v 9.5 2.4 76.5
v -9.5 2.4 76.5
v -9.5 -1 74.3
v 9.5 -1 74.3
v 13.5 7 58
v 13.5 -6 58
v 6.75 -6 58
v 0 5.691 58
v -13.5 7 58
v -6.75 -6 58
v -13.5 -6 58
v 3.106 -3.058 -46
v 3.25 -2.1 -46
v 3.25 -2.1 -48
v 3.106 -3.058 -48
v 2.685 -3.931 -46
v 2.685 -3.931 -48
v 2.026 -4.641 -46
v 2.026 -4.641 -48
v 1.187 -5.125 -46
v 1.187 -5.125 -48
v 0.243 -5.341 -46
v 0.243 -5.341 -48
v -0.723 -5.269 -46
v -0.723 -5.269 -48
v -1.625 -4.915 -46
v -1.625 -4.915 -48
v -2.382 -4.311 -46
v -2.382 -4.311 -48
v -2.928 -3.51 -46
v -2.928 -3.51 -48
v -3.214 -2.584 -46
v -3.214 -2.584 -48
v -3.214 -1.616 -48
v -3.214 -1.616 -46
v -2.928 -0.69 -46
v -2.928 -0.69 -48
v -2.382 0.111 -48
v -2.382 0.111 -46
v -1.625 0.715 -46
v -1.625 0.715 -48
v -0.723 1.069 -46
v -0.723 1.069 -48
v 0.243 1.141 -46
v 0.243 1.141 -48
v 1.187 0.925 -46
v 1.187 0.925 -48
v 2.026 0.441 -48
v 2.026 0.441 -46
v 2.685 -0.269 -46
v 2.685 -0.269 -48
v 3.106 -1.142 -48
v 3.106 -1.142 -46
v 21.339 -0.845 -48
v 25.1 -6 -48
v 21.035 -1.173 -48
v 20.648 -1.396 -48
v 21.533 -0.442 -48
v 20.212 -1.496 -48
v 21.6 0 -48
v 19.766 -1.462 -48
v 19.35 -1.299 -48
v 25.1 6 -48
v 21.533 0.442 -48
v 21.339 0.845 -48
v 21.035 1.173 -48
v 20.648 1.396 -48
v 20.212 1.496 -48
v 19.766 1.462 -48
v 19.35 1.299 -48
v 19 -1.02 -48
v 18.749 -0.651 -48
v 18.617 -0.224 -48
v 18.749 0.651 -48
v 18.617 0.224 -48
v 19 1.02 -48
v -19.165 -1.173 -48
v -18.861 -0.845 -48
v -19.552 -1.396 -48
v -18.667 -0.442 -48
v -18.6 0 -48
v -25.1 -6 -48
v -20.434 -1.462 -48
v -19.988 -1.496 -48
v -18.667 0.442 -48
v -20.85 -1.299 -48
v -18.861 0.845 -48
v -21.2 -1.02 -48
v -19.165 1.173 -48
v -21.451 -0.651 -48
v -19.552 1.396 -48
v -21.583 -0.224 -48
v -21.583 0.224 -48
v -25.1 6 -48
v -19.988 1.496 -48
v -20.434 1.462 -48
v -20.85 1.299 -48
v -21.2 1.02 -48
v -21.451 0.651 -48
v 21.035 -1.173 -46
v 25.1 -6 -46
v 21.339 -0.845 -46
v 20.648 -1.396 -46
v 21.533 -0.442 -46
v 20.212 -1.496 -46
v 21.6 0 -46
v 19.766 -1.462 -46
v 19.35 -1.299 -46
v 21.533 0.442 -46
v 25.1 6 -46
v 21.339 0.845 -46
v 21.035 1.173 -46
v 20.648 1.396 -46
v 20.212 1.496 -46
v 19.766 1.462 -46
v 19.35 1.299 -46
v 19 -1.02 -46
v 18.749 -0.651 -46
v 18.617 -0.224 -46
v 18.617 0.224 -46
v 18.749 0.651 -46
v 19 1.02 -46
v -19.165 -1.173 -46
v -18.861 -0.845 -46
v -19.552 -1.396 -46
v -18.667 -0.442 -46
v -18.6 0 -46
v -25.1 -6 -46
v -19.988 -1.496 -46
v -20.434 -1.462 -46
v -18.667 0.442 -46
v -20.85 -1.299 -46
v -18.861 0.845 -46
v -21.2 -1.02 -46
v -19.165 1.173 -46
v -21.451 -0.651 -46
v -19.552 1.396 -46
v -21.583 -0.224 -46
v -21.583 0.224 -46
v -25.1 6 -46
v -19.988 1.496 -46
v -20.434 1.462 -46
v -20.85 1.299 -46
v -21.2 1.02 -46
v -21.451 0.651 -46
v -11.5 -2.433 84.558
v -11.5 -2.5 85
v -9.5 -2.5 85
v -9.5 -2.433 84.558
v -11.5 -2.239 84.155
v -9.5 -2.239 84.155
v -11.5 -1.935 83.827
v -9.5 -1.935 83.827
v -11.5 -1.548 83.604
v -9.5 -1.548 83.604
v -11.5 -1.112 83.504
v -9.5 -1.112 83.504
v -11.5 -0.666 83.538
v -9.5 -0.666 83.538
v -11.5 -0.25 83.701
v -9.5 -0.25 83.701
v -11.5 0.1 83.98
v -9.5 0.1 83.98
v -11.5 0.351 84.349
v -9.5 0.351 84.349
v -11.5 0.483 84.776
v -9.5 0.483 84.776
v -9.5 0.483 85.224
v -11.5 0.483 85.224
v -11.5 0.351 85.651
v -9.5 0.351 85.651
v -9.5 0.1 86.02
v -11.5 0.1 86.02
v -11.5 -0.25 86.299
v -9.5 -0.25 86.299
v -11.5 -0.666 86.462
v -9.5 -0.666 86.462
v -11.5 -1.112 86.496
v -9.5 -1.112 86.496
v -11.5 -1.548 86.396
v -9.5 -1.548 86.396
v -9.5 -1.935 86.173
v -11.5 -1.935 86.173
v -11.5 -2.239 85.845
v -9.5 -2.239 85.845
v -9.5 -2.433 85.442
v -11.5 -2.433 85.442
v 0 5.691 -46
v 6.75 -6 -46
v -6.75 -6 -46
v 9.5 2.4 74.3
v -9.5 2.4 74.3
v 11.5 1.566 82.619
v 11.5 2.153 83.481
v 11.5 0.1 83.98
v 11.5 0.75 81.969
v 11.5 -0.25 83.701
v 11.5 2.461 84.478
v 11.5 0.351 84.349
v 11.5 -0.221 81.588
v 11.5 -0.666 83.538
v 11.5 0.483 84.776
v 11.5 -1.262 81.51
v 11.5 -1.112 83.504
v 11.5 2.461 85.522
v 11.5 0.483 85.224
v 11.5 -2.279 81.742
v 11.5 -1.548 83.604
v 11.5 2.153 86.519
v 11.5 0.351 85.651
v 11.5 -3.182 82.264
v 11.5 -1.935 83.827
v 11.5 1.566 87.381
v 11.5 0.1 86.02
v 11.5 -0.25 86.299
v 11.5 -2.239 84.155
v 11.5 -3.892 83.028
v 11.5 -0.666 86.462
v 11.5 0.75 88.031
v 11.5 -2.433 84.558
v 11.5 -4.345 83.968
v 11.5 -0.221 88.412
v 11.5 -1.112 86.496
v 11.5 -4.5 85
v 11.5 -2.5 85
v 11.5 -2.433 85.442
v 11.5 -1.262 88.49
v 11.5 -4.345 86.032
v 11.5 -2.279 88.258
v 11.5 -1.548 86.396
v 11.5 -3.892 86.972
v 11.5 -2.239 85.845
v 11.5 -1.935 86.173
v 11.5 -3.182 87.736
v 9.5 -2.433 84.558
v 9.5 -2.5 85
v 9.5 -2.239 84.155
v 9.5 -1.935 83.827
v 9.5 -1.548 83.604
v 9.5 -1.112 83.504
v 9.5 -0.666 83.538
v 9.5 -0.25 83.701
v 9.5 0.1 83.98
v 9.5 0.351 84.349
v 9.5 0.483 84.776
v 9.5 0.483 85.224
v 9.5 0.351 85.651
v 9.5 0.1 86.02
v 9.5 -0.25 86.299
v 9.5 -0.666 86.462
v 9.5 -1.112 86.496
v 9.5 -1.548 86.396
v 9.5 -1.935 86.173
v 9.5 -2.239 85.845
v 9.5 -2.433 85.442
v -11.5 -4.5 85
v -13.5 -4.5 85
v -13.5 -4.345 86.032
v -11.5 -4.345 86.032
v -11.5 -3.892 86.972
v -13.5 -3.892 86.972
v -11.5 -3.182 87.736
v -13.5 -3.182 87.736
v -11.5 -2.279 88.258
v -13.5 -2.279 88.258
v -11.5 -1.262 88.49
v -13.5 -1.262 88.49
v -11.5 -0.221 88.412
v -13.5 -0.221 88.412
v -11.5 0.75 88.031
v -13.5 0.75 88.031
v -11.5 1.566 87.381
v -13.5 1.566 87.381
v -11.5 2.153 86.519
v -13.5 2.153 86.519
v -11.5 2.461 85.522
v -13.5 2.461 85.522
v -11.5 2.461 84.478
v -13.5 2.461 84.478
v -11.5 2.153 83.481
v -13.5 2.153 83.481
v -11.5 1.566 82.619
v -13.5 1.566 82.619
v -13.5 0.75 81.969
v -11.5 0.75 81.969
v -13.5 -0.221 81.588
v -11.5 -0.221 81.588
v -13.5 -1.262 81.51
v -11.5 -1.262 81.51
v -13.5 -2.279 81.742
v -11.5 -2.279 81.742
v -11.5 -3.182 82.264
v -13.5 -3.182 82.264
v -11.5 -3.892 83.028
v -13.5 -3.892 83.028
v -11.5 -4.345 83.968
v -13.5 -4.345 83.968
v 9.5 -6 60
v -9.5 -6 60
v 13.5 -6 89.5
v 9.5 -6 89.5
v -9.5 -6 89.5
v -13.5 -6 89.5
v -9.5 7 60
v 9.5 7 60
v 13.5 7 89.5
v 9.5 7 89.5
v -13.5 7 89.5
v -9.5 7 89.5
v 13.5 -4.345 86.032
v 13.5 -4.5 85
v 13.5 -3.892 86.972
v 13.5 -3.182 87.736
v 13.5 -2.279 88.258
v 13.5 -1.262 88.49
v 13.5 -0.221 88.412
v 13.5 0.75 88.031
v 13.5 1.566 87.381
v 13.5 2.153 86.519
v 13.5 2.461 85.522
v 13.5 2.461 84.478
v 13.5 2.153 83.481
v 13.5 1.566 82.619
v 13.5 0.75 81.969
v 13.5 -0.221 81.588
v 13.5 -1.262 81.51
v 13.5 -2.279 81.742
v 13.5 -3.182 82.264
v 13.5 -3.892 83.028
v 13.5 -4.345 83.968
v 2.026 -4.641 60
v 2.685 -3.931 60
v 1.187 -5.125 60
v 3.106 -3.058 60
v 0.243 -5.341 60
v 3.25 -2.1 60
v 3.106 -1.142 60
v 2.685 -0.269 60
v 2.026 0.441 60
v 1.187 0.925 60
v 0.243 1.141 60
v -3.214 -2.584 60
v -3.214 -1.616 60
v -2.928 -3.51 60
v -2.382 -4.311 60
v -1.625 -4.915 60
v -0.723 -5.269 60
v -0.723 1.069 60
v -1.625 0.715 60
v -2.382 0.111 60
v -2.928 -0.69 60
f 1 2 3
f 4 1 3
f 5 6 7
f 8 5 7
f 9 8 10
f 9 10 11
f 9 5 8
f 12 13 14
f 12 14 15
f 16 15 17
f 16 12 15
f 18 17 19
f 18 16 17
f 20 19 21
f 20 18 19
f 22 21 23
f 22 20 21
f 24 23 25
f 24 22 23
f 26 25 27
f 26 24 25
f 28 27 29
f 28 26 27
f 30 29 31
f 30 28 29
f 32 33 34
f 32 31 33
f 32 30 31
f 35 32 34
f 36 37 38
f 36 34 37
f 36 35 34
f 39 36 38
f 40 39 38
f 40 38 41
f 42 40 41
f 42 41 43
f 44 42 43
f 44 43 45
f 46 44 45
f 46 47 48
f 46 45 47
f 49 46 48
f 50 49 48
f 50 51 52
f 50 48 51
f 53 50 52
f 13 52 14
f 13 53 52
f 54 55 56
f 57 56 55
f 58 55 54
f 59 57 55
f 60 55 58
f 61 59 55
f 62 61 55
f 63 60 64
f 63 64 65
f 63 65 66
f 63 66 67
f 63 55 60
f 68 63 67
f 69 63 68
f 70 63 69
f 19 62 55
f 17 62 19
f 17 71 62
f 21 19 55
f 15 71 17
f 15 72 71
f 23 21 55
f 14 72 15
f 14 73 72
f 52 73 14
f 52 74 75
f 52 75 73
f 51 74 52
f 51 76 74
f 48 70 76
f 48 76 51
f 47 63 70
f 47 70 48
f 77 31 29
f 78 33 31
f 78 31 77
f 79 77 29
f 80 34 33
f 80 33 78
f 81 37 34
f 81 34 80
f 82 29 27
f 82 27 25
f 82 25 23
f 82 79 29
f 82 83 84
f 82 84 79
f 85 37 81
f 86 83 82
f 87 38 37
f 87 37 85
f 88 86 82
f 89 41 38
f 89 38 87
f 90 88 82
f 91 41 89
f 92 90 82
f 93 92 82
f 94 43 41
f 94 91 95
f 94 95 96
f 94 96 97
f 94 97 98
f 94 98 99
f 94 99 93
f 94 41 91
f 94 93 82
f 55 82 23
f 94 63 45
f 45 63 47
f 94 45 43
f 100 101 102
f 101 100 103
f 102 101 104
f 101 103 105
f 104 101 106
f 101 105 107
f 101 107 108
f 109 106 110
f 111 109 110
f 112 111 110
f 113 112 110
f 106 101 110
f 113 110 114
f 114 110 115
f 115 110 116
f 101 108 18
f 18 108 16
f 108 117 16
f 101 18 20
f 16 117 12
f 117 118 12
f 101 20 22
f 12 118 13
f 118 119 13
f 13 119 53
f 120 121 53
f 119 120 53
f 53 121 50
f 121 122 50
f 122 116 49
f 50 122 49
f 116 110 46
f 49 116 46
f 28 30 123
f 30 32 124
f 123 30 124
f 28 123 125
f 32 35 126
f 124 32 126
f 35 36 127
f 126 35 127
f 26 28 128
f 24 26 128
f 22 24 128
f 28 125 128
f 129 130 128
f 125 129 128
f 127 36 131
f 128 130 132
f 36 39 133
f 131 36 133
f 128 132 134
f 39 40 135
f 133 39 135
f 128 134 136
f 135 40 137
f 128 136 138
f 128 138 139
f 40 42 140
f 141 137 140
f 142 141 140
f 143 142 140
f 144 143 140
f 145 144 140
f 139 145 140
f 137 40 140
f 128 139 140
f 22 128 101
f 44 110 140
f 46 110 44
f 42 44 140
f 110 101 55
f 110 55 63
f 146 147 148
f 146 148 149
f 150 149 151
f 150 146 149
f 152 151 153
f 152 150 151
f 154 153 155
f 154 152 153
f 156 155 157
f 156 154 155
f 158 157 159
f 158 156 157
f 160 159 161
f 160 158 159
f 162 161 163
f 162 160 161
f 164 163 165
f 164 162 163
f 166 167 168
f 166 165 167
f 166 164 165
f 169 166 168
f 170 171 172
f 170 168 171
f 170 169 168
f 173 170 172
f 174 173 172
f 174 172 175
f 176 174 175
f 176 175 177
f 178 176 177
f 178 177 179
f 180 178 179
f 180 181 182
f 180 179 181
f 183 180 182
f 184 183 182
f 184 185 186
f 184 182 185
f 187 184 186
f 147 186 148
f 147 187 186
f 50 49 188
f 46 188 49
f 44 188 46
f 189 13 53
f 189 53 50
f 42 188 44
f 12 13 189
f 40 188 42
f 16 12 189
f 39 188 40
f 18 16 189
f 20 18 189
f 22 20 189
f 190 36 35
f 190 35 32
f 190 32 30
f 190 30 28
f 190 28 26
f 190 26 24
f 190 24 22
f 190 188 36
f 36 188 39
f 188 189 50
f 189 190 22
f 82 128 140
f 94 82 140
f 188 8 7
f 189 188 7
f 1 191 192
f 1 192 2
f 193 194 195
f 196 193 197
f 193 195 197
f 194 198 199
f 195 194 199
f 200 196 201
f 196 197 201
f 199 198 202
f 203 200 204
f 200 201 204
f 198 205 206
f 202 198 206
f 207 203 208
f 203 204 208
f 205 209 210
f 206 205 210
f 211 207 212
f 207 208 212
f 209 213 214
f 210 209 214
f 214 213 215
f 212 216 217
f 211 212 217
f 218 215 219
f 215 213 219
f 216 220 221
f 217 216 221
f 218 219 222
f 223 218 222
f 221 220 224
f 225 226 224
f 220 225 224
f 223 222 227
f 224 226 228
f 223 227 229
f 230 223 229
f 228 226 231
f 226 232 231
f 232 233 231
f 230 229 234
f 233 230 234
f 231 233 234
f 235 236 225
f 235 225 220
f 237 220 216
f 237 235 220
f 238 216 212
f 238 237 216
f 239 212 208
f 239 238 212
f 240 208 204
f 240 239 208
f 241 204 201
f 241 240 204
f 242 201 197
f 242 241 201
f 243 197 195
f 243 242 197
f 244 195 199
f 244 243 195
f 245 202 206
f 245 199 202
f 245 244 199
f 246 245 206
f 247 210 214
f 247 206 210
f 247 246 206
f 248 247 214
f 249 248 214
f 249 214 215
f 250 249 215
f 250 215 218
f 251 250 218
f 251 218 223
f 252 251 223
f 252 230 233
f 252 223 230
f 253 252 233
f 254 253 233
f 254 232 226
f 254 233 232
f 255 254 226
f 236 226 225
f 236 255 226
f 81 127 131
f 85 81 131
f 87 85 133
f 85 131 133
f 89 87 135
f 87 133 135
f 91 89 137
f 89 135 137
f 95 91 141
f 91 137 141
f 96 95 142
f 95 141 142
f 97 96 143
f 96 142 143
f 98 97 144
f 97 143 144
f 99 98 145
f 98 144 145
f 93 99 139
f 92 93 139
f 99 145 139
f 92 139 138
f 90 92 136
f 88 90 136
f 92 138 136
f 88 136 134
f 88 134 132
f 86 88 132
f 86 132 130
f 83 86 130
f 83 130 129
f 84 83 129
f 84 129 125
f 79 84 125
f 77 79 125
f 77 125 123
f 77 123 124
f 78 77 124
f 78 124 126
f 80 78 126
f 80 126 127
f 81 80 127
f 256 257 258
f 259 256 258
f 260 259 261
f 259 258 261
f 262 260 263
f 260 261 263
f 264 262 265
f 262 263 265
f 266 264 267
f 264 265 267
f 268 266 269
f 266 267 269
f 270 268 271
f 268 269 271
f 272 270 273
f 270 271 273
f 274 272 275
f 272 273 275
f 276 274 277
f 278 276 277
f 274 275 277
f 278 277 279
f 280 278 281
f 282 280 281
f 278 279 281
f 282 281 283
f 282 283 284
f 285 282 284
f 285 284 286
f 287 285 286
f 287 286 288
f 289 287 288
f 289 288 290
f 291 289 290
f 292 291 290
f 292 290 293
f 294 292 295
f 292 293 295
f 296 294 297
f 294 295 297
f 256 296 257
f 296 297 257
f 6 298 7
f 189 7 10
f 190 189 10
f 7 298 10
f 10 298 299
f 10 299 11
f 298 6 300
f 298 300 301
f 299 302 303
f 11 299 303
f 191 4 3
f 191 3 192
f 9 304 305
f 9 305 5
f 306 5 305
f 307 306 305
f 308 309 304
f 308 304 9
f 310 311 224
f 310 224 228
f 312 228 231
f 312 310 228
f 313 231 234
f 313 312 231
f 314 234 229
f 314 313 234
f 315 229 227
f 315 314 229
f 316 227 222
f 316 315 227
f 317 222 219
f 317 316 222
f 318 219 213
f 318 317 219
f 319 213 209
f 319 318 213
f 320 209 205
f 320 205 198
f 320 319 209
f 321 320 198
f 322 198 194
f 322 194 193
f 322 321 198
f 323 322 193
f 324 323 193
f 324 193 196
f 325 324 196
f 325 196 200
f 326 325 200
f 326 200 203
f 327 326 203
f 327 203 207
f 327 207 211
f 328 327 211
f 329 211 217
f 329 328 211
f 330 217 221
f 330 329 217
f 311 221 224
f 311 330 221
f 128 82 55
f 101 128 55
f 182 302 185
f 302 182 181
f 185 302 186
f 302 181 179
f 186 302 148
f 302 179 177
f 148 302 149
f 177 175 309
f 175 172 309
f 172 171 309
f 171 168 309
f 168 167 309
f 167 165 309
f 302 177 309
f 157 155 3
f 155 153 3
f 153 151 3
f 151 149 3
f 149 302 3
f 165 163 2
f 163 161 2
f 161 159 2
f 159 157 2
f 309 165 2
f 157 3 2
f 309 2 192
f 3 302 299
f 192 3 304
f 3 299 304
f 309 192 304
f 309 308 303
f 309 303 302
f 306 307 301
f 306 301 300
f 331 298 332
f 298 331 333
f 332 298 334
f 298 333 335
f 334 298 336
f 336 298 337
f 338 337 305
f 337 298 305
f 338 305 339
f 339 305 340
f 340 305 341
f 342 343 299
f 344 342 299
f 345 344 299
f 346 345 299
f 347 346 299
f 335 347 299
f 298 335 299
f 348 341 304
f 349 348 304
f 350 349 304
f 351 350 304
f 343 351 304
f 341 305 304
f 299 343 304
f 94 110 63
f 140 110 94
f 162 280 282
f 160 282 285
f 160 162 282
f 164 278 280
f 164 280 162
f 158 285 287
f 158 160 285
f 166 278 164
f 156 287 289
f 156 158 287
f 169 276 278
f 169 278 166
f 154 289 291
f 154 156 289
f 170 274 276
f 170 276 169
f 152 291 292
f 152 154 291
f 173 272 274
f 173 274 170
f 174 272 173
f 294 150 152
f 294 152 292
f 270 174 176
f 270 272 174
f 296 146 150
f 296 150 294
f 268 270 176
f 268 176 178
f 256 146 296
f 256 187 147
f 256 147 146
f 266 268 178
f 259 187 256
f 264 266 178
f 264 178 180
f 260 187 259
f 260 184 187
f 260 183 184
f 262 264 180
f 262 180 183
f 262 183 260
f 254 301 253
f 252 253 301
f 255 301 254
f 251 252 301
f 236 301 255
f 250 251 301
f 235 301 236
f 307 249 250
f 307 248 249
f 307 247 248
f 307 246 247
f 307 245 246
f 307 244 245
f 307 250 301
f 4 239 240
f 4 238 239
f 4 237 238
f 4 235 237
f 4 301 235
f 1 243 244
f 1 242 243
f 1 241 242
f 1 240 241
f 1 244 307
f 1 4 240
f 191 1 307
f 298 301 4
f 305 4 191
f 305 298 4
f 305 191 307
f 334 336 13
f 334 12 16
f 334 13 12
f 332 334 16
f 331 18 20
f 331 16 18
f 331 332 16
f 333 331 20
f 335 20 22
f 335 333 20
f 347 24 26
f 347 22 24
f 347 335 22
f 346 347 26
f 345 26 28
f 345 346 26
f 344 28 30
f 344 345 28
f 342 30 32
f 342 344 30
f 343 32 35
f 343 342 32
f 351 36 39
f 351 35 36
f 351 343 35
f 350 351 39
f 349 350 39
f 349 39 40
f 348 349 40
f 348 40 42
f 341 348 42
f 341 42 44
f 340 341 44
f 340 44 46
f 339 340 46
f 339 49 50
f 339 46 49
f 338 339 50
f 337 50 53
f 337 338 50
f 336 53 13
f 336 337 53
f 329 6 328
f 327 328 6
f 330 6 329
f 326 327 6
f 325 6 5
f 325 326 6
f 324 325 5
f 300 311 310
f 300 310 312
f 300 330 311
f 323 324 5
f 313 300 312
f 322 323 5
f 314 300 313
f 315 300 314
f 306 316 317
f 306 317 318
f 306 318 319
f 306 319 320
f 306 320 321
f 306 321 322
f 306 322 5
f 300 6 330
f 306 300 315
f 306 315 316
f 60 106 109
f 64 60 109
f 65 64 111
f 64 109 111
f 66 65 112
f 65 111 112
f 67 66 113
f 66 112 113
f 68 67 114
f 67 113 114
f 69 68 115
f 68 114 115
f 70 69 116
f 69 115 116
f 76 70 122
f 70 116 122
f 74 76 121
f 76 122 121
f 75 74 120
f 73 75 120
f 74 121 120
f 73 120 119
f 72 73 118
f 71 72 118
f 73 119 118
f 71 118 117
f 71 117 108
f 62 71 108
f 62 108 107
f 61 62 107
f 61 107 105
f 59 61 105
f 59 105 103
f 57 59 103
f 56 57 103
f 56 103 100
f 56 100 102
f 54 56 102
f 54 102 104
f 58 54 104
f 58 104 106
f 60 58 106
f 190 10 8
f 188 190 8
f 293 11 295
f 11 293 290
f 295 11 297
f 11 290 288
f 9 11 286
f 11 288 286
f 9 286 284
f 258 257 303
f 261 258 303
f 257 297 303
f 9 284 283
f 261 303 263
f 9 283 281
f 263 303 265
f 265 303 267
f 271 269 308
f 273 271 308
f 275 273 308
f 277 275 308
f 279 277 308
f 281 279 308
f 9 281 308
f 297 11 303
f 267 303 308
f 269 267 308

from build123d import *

# Parameters (mm, degrees)
SKETCH_1_W                     = 50.2
SKETCH_1_H                     = 22
EXTRUDE_1_DEPTH                = 2.5
SKETCH_2_R                     = 1.5
CUT_EXTRUDE_1_DEPTH            = 2.5
SKETCH_4_W                     = 4
SKETCH_4_H                     = 16
EXTRUDE_2_DEPTH                = 87
EXTRUDE_3_REACH                = 100.673
SKETCH_5_R                     = 2
CUT_EXTRUDE_2_DEPTH            = 99.673248654
CUT_EXTRUDE_2_DEPTH_BACK       = 99.673248654
SKETCH_6_R                     = 1.5
SKETCH_7_R                     = 3.5
CUT_EXTRUDE_3_DEPTH            = 2
FILLET_1_R                     = 2
SKETCH_8_W                     = 50.2
SKETCH_8_H                     = 2.5
EXTRUDE_4_DEPTH                = 3
EXTRUDE_8_DEPTH                = 22
SKETCH_16_W                    = 51.125372974
SKETCH_16_H                    = 33.398780813
CUT_EXTRUDE_4_DEPTH            = 60
SKETCH_17_W                    = 27
SKETCH_17_H                    = 16
EXTRUDE_9_DEPTH                = 2
EXTRUDE_11_DEPTH               = 104
SKETCH_19_W                    = 50.2
SKETCH_19_H                    = 29
EXTRUDE_12_DEPTH               = 2
SKETCH_20_R                    = 1.5
CUT_EXTRUDE_5_DEPTH            = 8
SPLIT_BODIES_1_SURFACE_1_BACK  = 150.222
SPLIT_BODIES_1_SURFACE_1_DEPTH = 300.444
SPLIT_BODIES_1_SURFACE_2_BACK  = 150.222
SPLIT_BODIES_1_SURFACE_2_DEPTH = 300.444
CUT_EXTRUDE_7_DEPTH            = 164
CUT_EXTRUDE_7_DEPTH_BACK       = 164
SKETCH_21_W                    = 50.2
SKETCH_21_H                    = 17
CUT_EXTRUDE_9_DEPTH            = 10
CUT_EXTRUDE_9_DEPTH_BACK       = 110
SKETCH_26_R                    = 3.25


with BuildPart() as part:
    # 草图1 → 凸台-拉伸1 (new body)
    with BuildSketch(Plane.XY):
        with Locations((0, -5)):
            Rectangle(SKETCH_1_W, SKETCH_1_H)
    extrude(amount=EXTRUDE_1_DEPTH)

    # 草图2 → 切除-拉伸1 (cut)
    with BuildSketch(Plane.XY.offset(2.5)):
        with Locations((-20.1, 0)):
            Circle(SKETCH_2_R)
        with Locations(Location((20.1, 0, 0), (0, 0, 180))):
            Circle(SKETCH_2_R)
    extrude(amount=-CUT_EXTRUDE_1_DEPTH, mode=Mode.SUBTRACT)

    # 草图4 → 凸台-拉伸2 (add)
    with BuildSketch(Plane.XY.offset(2.5)):
        with Locations((-11.5, -15)):
            Rectangle(SKETCH_4_W, SKETCH_4_H)
        with Locations((11.5, -15)):
            Rectangle(SKETCH_4_W, SKETCH_4_H)
    extrude(amount=EXTRUDE_2_DEPTH)

    # 草图5 → 凸台-拉伸3 (add, up to next)
    with BuildSketch(Plane.ZY.offset(-9.5), mode=Mode.PRIVATE) as extrude_3_sk1:
        with Locations((46, -15)):
            Circle(SKETCH_5_R)
    extrude_3_tool1 = extrude(extrude_3_sk1.sketch, amount=EXTRUDE_3_REACH, mode=Mode.PRIVATE) - part.part
    add(extrude_3_tool1.solids().sort_by_distance((9.5, -15, 46))[0])

    # 草图6 → 切除-拉伸2 (cut, two sides: drawn at the far end of the back side and taken through both)
    with BuildSketch(Plane(origin=(-9.5, 0, 0), x_dir=(0, 0, -1), z_dir=(1, 0, 0)).offset(-CUT_EXTRUDE_2_DEPTH_BACK)):
        with Locations(Location((-85, -15, 0), (0, 0, 270))):
            Circle(SKETCH_6_R)
    extrude(amount=CUT_EXTRUDE_2_DEPTH + CUT_EXTRUDE_2_DEPTH_BACK, mode=Mode.SUBTRACT)

    # 草图7 → 切除-拉伸3 (cut)
    with BuildSketch(Plane.ZY.offset(13.5)):
        with Locations(Location((85, -15, 0), (0, 0, 270))):
            Circle(SKETCH_7_R)
    cut_extrude_3 = extrude(amount=-CUT_EXTRUDE_3_DEPTH, mode=Mode.SUBTRACT)

    # 镜向1: 切除-拉伸3 across plane
    add(cut_extrude_3.mirror(Plane(origin=(0, 0, 0), x_dir=(0, 0, 1), z_dir=(1, 0, 0))), mode=Mode.SUBTRACT)

    # 圆角1
    fillet_1_edges = [part.edges().sort_by_distance(p)[0] for p in [
        (-11.5, -16, 2.5),
        (11.5, -16, 2.5),
    ]]
    fillet(fillet_1_edges, radius=FILLET_1_R)

    # 草图8 → 凸台-拉伸4 (add)
    with BuildSketch(Plane(origin=(0, 6, 0), x_dir=(1, 0, 0), z_dir=(0, 1, 0))):
        with Locations((0, -1.25)):
            Rectangle(SKETCH_8_W, SKETCH_8_H)
    extrude(amount=EXTRUDE_4_DEPTH)

    # 草图15 → 凸台-拉伸8 (add)
    with BuildSketch(Plane.ZY.offset(-9.5)):
        Polygon((74.3, -11.6), (76.5, -11.6), (74.3, -15), align=None)
    extrude(amount=EXTRUDE_8_DEPTH)

    # 草图16 → 切除-拉伸4 (cut)
    with BuildSketch(Plane(origin=(0, 0, 0), x_dir=(-1, 0, 0), z_dir=(0, 0, -1))):
        with Locations((0.462686487, -7.699390407)):
            Rectangle(SKETCH_16_W, SKETCH_16_H)
    extrude(amount=-CUT_EXTRUDE_4_DEPTH, mode=Mode.SUBTRACT)

    # 草图17 → 凸台-拉伸9 (add)
    with BuildSketch(Plane(origin=(0, 0, 60), x_dir=(-1, 0, 0), z_dir=(0, 0, -1))):
        with Locations((0, -15)):
            Rectangle(SKETCH_17_W, SKETCH_17_H)
    extrude(amount=EXTRUDE_9_DEPTH)

    # 草图18 → 凸台-拉伸11 (add)
    with BuildSketch(Plane(origin=(0, 0, 58), x_dir=(-1, 0, 0), z_dir=(0, 0, -1))):
        Polygon((0, -8.308657049), (-6.75, -20), (6.75, -20), align=None)
    extrude(amount=EXTRUDE_11_DEPTH)

    # 草图19 → 凸台-拉伸12 (add)
    with BuildSketch(Plane(origin=(0, 0, -46), x_dir=(-1, 0, 0), z_dir=(0, 0, -1))):
        with Locations((0, -8.5)):
            Rectangle(SKETCH_19_W, SKETCH_19_H)
    extrude(amount=EXTRUDE_12_DEPTH)

    # 草图20 → 切除-拉伸5 (cut)
    with BuildSketch(Plane.XY.offset(-46)):
        with Locations((-20.1, 0)):
            Circle(SKETCH_20_R)
        with Locations((20.1, 0)):
            Circle(SKETCH_20_R)
    extrude(amount=-CUT_EXTRUDE_5_DEPTH, mode=Mode.SUBTRACT)


with BuildPart() as body_2:
    # Split Bodies 1: the piece behind the surface
    add(part.part)
    # Split Bodies 1 surface: a surface, the sketch's curves swept straight by 300.444 mm
    with BuildLine(Plane(origin=(25.1, 0, 0), x_dir=(0, 0, -1), z_dir=(1, 0, 0)).offset(-SPLIT_BODIES_1_SURFACE_1_BACK), mode=Mode.PRIVATE) as split_bodies_1_surface_1_path:
        Line((46, -8), (46, -23))
    split_bodies_1_surface_1 = Shell.extrude(split_bodies_1_surface_1_path.wire(), (1 * SPLIT_BODIES_1_SURFACE_1_DEPTH, 0 * SPLIT_BODIES_1_SURFACE_1_DEPTH, 0 * SPLIT_BODIES_1_SURFACE_1_DEPTH))
    split(bisect_by=split_bodies_1_surface_1, keep=Keep.BOTTOM)


with BuildPart() as part_1:
    add(part.part)

    # Split Bodies 1: split by a surface, the side it looks to stays
    # Split Bodies 1 surface: a surface, the sketch's curves swept straight by 300.444 mm
    with BuildLine(Plane(origin=(25.1, 0, 0), x_dir=(0, 0, -1), z_dir=(1, 0, 0)).offset(-SPLIT_BODIES_1_SURFACE_2_BACK), mode=Mode.PRIVATE) as split_bodies_1_surface_2_path:
        Line((46, -8), (46, -23))
    split_bodies_1_surface_2 = Shell.extrude(split_bodies_1_surface_2_path.wire(), (1 * SPLIT_BODIES_1_SURFACE_2_DEPTH, 0 * SPLIT_BODIES_1_SURFACE_2_DEPTH, 0 * SPLIT_BODIES_1_SURFACE_2_DEPTH))
    split(bisect_by=split_bodies_1_surface_2, keep=Keep.TOP)


with BuildPart() as body_3:
    # Move Body 1: copy of body 2
    add(body_2.part.moved(Location((0, 14, 0))))


with BuildPart() as cut_extrude_7_tool:
    # 草图21 → 切除-拉伸7 (new, two sides: drawn at the far end of the back side and taken through both)
    with BuildSketch(Plane.XY.offset(-46).offset(-CUT_EXTRUDE_7_DEPTH_BACK)):
        with Locations((0, -14.5)):
            Rectangle(SKETCH_21_W, SKETCH_21_H)
    extrude(amount=CUT_EXTRUDE_7_DEPTH + CUT_EXTRUDE_7_DEPTH_BACK)


with BuildPart() as part_2:
    add(part_1.part)

    # 切除-拉伸7: cut by cut_extrude_7_tool
    add(cut_extrude_7_tool.part, mode=Mode.SUBTRACT)


with BuildPart() as body_2_1:
    add(body_2.part)

    # 切除-拉伸7: cut by cut_extrude_7_tool
    add(cut_extrude_7_tool.part, mode=Mode.SUBTRACT)


with BuildPart() as body_3_1:
    add(body_3.part)

    # 切除-拉伸7: cut by cut_extrude_7_tool
    add(cut_extrude_7_tool.part, mode=Mode.SUBTRACT)


with BuildPart() as cut_extrude_9_tool:
    # 草图26 → 切除-拉伸9 (new, two sides: drawn at the far end of the back side and taken through both)
    with BuildSketch(Plane(origin=(0, 0, -48), x_dir=(-1, 0, 0), z_dir=(0, 0, -1)).offset(-CUT_EXTRUDE_9_DEPTH_BACK)):
        with Locations(Location((0, -2.1, 0), (0, 0, 180))):
            Circle(SKETCH_26_R)
    extrude(amount=CUT_EXTRUDE_9_DEPTH + CUT_EXTRUDE_9_DEPTH_BACK)


with BuildPart() as part_3:
    add(part_2.part)

    # 切除-拉伸9: cut by cut_extrude_9_tool
    add(cut_extrude_9_tool.part, mode=Mode.SUBTRACT)


with BuildPart() as body_3_2:
    add(body_3_1.part)

    # 切除-拉伸9: cut by cut_extrude_9_tool
    add(cut_extrude_9_tool.part, mode=Mode.SUBTRACT)


solid = Compound([part_3.part, body_3_2.part])
